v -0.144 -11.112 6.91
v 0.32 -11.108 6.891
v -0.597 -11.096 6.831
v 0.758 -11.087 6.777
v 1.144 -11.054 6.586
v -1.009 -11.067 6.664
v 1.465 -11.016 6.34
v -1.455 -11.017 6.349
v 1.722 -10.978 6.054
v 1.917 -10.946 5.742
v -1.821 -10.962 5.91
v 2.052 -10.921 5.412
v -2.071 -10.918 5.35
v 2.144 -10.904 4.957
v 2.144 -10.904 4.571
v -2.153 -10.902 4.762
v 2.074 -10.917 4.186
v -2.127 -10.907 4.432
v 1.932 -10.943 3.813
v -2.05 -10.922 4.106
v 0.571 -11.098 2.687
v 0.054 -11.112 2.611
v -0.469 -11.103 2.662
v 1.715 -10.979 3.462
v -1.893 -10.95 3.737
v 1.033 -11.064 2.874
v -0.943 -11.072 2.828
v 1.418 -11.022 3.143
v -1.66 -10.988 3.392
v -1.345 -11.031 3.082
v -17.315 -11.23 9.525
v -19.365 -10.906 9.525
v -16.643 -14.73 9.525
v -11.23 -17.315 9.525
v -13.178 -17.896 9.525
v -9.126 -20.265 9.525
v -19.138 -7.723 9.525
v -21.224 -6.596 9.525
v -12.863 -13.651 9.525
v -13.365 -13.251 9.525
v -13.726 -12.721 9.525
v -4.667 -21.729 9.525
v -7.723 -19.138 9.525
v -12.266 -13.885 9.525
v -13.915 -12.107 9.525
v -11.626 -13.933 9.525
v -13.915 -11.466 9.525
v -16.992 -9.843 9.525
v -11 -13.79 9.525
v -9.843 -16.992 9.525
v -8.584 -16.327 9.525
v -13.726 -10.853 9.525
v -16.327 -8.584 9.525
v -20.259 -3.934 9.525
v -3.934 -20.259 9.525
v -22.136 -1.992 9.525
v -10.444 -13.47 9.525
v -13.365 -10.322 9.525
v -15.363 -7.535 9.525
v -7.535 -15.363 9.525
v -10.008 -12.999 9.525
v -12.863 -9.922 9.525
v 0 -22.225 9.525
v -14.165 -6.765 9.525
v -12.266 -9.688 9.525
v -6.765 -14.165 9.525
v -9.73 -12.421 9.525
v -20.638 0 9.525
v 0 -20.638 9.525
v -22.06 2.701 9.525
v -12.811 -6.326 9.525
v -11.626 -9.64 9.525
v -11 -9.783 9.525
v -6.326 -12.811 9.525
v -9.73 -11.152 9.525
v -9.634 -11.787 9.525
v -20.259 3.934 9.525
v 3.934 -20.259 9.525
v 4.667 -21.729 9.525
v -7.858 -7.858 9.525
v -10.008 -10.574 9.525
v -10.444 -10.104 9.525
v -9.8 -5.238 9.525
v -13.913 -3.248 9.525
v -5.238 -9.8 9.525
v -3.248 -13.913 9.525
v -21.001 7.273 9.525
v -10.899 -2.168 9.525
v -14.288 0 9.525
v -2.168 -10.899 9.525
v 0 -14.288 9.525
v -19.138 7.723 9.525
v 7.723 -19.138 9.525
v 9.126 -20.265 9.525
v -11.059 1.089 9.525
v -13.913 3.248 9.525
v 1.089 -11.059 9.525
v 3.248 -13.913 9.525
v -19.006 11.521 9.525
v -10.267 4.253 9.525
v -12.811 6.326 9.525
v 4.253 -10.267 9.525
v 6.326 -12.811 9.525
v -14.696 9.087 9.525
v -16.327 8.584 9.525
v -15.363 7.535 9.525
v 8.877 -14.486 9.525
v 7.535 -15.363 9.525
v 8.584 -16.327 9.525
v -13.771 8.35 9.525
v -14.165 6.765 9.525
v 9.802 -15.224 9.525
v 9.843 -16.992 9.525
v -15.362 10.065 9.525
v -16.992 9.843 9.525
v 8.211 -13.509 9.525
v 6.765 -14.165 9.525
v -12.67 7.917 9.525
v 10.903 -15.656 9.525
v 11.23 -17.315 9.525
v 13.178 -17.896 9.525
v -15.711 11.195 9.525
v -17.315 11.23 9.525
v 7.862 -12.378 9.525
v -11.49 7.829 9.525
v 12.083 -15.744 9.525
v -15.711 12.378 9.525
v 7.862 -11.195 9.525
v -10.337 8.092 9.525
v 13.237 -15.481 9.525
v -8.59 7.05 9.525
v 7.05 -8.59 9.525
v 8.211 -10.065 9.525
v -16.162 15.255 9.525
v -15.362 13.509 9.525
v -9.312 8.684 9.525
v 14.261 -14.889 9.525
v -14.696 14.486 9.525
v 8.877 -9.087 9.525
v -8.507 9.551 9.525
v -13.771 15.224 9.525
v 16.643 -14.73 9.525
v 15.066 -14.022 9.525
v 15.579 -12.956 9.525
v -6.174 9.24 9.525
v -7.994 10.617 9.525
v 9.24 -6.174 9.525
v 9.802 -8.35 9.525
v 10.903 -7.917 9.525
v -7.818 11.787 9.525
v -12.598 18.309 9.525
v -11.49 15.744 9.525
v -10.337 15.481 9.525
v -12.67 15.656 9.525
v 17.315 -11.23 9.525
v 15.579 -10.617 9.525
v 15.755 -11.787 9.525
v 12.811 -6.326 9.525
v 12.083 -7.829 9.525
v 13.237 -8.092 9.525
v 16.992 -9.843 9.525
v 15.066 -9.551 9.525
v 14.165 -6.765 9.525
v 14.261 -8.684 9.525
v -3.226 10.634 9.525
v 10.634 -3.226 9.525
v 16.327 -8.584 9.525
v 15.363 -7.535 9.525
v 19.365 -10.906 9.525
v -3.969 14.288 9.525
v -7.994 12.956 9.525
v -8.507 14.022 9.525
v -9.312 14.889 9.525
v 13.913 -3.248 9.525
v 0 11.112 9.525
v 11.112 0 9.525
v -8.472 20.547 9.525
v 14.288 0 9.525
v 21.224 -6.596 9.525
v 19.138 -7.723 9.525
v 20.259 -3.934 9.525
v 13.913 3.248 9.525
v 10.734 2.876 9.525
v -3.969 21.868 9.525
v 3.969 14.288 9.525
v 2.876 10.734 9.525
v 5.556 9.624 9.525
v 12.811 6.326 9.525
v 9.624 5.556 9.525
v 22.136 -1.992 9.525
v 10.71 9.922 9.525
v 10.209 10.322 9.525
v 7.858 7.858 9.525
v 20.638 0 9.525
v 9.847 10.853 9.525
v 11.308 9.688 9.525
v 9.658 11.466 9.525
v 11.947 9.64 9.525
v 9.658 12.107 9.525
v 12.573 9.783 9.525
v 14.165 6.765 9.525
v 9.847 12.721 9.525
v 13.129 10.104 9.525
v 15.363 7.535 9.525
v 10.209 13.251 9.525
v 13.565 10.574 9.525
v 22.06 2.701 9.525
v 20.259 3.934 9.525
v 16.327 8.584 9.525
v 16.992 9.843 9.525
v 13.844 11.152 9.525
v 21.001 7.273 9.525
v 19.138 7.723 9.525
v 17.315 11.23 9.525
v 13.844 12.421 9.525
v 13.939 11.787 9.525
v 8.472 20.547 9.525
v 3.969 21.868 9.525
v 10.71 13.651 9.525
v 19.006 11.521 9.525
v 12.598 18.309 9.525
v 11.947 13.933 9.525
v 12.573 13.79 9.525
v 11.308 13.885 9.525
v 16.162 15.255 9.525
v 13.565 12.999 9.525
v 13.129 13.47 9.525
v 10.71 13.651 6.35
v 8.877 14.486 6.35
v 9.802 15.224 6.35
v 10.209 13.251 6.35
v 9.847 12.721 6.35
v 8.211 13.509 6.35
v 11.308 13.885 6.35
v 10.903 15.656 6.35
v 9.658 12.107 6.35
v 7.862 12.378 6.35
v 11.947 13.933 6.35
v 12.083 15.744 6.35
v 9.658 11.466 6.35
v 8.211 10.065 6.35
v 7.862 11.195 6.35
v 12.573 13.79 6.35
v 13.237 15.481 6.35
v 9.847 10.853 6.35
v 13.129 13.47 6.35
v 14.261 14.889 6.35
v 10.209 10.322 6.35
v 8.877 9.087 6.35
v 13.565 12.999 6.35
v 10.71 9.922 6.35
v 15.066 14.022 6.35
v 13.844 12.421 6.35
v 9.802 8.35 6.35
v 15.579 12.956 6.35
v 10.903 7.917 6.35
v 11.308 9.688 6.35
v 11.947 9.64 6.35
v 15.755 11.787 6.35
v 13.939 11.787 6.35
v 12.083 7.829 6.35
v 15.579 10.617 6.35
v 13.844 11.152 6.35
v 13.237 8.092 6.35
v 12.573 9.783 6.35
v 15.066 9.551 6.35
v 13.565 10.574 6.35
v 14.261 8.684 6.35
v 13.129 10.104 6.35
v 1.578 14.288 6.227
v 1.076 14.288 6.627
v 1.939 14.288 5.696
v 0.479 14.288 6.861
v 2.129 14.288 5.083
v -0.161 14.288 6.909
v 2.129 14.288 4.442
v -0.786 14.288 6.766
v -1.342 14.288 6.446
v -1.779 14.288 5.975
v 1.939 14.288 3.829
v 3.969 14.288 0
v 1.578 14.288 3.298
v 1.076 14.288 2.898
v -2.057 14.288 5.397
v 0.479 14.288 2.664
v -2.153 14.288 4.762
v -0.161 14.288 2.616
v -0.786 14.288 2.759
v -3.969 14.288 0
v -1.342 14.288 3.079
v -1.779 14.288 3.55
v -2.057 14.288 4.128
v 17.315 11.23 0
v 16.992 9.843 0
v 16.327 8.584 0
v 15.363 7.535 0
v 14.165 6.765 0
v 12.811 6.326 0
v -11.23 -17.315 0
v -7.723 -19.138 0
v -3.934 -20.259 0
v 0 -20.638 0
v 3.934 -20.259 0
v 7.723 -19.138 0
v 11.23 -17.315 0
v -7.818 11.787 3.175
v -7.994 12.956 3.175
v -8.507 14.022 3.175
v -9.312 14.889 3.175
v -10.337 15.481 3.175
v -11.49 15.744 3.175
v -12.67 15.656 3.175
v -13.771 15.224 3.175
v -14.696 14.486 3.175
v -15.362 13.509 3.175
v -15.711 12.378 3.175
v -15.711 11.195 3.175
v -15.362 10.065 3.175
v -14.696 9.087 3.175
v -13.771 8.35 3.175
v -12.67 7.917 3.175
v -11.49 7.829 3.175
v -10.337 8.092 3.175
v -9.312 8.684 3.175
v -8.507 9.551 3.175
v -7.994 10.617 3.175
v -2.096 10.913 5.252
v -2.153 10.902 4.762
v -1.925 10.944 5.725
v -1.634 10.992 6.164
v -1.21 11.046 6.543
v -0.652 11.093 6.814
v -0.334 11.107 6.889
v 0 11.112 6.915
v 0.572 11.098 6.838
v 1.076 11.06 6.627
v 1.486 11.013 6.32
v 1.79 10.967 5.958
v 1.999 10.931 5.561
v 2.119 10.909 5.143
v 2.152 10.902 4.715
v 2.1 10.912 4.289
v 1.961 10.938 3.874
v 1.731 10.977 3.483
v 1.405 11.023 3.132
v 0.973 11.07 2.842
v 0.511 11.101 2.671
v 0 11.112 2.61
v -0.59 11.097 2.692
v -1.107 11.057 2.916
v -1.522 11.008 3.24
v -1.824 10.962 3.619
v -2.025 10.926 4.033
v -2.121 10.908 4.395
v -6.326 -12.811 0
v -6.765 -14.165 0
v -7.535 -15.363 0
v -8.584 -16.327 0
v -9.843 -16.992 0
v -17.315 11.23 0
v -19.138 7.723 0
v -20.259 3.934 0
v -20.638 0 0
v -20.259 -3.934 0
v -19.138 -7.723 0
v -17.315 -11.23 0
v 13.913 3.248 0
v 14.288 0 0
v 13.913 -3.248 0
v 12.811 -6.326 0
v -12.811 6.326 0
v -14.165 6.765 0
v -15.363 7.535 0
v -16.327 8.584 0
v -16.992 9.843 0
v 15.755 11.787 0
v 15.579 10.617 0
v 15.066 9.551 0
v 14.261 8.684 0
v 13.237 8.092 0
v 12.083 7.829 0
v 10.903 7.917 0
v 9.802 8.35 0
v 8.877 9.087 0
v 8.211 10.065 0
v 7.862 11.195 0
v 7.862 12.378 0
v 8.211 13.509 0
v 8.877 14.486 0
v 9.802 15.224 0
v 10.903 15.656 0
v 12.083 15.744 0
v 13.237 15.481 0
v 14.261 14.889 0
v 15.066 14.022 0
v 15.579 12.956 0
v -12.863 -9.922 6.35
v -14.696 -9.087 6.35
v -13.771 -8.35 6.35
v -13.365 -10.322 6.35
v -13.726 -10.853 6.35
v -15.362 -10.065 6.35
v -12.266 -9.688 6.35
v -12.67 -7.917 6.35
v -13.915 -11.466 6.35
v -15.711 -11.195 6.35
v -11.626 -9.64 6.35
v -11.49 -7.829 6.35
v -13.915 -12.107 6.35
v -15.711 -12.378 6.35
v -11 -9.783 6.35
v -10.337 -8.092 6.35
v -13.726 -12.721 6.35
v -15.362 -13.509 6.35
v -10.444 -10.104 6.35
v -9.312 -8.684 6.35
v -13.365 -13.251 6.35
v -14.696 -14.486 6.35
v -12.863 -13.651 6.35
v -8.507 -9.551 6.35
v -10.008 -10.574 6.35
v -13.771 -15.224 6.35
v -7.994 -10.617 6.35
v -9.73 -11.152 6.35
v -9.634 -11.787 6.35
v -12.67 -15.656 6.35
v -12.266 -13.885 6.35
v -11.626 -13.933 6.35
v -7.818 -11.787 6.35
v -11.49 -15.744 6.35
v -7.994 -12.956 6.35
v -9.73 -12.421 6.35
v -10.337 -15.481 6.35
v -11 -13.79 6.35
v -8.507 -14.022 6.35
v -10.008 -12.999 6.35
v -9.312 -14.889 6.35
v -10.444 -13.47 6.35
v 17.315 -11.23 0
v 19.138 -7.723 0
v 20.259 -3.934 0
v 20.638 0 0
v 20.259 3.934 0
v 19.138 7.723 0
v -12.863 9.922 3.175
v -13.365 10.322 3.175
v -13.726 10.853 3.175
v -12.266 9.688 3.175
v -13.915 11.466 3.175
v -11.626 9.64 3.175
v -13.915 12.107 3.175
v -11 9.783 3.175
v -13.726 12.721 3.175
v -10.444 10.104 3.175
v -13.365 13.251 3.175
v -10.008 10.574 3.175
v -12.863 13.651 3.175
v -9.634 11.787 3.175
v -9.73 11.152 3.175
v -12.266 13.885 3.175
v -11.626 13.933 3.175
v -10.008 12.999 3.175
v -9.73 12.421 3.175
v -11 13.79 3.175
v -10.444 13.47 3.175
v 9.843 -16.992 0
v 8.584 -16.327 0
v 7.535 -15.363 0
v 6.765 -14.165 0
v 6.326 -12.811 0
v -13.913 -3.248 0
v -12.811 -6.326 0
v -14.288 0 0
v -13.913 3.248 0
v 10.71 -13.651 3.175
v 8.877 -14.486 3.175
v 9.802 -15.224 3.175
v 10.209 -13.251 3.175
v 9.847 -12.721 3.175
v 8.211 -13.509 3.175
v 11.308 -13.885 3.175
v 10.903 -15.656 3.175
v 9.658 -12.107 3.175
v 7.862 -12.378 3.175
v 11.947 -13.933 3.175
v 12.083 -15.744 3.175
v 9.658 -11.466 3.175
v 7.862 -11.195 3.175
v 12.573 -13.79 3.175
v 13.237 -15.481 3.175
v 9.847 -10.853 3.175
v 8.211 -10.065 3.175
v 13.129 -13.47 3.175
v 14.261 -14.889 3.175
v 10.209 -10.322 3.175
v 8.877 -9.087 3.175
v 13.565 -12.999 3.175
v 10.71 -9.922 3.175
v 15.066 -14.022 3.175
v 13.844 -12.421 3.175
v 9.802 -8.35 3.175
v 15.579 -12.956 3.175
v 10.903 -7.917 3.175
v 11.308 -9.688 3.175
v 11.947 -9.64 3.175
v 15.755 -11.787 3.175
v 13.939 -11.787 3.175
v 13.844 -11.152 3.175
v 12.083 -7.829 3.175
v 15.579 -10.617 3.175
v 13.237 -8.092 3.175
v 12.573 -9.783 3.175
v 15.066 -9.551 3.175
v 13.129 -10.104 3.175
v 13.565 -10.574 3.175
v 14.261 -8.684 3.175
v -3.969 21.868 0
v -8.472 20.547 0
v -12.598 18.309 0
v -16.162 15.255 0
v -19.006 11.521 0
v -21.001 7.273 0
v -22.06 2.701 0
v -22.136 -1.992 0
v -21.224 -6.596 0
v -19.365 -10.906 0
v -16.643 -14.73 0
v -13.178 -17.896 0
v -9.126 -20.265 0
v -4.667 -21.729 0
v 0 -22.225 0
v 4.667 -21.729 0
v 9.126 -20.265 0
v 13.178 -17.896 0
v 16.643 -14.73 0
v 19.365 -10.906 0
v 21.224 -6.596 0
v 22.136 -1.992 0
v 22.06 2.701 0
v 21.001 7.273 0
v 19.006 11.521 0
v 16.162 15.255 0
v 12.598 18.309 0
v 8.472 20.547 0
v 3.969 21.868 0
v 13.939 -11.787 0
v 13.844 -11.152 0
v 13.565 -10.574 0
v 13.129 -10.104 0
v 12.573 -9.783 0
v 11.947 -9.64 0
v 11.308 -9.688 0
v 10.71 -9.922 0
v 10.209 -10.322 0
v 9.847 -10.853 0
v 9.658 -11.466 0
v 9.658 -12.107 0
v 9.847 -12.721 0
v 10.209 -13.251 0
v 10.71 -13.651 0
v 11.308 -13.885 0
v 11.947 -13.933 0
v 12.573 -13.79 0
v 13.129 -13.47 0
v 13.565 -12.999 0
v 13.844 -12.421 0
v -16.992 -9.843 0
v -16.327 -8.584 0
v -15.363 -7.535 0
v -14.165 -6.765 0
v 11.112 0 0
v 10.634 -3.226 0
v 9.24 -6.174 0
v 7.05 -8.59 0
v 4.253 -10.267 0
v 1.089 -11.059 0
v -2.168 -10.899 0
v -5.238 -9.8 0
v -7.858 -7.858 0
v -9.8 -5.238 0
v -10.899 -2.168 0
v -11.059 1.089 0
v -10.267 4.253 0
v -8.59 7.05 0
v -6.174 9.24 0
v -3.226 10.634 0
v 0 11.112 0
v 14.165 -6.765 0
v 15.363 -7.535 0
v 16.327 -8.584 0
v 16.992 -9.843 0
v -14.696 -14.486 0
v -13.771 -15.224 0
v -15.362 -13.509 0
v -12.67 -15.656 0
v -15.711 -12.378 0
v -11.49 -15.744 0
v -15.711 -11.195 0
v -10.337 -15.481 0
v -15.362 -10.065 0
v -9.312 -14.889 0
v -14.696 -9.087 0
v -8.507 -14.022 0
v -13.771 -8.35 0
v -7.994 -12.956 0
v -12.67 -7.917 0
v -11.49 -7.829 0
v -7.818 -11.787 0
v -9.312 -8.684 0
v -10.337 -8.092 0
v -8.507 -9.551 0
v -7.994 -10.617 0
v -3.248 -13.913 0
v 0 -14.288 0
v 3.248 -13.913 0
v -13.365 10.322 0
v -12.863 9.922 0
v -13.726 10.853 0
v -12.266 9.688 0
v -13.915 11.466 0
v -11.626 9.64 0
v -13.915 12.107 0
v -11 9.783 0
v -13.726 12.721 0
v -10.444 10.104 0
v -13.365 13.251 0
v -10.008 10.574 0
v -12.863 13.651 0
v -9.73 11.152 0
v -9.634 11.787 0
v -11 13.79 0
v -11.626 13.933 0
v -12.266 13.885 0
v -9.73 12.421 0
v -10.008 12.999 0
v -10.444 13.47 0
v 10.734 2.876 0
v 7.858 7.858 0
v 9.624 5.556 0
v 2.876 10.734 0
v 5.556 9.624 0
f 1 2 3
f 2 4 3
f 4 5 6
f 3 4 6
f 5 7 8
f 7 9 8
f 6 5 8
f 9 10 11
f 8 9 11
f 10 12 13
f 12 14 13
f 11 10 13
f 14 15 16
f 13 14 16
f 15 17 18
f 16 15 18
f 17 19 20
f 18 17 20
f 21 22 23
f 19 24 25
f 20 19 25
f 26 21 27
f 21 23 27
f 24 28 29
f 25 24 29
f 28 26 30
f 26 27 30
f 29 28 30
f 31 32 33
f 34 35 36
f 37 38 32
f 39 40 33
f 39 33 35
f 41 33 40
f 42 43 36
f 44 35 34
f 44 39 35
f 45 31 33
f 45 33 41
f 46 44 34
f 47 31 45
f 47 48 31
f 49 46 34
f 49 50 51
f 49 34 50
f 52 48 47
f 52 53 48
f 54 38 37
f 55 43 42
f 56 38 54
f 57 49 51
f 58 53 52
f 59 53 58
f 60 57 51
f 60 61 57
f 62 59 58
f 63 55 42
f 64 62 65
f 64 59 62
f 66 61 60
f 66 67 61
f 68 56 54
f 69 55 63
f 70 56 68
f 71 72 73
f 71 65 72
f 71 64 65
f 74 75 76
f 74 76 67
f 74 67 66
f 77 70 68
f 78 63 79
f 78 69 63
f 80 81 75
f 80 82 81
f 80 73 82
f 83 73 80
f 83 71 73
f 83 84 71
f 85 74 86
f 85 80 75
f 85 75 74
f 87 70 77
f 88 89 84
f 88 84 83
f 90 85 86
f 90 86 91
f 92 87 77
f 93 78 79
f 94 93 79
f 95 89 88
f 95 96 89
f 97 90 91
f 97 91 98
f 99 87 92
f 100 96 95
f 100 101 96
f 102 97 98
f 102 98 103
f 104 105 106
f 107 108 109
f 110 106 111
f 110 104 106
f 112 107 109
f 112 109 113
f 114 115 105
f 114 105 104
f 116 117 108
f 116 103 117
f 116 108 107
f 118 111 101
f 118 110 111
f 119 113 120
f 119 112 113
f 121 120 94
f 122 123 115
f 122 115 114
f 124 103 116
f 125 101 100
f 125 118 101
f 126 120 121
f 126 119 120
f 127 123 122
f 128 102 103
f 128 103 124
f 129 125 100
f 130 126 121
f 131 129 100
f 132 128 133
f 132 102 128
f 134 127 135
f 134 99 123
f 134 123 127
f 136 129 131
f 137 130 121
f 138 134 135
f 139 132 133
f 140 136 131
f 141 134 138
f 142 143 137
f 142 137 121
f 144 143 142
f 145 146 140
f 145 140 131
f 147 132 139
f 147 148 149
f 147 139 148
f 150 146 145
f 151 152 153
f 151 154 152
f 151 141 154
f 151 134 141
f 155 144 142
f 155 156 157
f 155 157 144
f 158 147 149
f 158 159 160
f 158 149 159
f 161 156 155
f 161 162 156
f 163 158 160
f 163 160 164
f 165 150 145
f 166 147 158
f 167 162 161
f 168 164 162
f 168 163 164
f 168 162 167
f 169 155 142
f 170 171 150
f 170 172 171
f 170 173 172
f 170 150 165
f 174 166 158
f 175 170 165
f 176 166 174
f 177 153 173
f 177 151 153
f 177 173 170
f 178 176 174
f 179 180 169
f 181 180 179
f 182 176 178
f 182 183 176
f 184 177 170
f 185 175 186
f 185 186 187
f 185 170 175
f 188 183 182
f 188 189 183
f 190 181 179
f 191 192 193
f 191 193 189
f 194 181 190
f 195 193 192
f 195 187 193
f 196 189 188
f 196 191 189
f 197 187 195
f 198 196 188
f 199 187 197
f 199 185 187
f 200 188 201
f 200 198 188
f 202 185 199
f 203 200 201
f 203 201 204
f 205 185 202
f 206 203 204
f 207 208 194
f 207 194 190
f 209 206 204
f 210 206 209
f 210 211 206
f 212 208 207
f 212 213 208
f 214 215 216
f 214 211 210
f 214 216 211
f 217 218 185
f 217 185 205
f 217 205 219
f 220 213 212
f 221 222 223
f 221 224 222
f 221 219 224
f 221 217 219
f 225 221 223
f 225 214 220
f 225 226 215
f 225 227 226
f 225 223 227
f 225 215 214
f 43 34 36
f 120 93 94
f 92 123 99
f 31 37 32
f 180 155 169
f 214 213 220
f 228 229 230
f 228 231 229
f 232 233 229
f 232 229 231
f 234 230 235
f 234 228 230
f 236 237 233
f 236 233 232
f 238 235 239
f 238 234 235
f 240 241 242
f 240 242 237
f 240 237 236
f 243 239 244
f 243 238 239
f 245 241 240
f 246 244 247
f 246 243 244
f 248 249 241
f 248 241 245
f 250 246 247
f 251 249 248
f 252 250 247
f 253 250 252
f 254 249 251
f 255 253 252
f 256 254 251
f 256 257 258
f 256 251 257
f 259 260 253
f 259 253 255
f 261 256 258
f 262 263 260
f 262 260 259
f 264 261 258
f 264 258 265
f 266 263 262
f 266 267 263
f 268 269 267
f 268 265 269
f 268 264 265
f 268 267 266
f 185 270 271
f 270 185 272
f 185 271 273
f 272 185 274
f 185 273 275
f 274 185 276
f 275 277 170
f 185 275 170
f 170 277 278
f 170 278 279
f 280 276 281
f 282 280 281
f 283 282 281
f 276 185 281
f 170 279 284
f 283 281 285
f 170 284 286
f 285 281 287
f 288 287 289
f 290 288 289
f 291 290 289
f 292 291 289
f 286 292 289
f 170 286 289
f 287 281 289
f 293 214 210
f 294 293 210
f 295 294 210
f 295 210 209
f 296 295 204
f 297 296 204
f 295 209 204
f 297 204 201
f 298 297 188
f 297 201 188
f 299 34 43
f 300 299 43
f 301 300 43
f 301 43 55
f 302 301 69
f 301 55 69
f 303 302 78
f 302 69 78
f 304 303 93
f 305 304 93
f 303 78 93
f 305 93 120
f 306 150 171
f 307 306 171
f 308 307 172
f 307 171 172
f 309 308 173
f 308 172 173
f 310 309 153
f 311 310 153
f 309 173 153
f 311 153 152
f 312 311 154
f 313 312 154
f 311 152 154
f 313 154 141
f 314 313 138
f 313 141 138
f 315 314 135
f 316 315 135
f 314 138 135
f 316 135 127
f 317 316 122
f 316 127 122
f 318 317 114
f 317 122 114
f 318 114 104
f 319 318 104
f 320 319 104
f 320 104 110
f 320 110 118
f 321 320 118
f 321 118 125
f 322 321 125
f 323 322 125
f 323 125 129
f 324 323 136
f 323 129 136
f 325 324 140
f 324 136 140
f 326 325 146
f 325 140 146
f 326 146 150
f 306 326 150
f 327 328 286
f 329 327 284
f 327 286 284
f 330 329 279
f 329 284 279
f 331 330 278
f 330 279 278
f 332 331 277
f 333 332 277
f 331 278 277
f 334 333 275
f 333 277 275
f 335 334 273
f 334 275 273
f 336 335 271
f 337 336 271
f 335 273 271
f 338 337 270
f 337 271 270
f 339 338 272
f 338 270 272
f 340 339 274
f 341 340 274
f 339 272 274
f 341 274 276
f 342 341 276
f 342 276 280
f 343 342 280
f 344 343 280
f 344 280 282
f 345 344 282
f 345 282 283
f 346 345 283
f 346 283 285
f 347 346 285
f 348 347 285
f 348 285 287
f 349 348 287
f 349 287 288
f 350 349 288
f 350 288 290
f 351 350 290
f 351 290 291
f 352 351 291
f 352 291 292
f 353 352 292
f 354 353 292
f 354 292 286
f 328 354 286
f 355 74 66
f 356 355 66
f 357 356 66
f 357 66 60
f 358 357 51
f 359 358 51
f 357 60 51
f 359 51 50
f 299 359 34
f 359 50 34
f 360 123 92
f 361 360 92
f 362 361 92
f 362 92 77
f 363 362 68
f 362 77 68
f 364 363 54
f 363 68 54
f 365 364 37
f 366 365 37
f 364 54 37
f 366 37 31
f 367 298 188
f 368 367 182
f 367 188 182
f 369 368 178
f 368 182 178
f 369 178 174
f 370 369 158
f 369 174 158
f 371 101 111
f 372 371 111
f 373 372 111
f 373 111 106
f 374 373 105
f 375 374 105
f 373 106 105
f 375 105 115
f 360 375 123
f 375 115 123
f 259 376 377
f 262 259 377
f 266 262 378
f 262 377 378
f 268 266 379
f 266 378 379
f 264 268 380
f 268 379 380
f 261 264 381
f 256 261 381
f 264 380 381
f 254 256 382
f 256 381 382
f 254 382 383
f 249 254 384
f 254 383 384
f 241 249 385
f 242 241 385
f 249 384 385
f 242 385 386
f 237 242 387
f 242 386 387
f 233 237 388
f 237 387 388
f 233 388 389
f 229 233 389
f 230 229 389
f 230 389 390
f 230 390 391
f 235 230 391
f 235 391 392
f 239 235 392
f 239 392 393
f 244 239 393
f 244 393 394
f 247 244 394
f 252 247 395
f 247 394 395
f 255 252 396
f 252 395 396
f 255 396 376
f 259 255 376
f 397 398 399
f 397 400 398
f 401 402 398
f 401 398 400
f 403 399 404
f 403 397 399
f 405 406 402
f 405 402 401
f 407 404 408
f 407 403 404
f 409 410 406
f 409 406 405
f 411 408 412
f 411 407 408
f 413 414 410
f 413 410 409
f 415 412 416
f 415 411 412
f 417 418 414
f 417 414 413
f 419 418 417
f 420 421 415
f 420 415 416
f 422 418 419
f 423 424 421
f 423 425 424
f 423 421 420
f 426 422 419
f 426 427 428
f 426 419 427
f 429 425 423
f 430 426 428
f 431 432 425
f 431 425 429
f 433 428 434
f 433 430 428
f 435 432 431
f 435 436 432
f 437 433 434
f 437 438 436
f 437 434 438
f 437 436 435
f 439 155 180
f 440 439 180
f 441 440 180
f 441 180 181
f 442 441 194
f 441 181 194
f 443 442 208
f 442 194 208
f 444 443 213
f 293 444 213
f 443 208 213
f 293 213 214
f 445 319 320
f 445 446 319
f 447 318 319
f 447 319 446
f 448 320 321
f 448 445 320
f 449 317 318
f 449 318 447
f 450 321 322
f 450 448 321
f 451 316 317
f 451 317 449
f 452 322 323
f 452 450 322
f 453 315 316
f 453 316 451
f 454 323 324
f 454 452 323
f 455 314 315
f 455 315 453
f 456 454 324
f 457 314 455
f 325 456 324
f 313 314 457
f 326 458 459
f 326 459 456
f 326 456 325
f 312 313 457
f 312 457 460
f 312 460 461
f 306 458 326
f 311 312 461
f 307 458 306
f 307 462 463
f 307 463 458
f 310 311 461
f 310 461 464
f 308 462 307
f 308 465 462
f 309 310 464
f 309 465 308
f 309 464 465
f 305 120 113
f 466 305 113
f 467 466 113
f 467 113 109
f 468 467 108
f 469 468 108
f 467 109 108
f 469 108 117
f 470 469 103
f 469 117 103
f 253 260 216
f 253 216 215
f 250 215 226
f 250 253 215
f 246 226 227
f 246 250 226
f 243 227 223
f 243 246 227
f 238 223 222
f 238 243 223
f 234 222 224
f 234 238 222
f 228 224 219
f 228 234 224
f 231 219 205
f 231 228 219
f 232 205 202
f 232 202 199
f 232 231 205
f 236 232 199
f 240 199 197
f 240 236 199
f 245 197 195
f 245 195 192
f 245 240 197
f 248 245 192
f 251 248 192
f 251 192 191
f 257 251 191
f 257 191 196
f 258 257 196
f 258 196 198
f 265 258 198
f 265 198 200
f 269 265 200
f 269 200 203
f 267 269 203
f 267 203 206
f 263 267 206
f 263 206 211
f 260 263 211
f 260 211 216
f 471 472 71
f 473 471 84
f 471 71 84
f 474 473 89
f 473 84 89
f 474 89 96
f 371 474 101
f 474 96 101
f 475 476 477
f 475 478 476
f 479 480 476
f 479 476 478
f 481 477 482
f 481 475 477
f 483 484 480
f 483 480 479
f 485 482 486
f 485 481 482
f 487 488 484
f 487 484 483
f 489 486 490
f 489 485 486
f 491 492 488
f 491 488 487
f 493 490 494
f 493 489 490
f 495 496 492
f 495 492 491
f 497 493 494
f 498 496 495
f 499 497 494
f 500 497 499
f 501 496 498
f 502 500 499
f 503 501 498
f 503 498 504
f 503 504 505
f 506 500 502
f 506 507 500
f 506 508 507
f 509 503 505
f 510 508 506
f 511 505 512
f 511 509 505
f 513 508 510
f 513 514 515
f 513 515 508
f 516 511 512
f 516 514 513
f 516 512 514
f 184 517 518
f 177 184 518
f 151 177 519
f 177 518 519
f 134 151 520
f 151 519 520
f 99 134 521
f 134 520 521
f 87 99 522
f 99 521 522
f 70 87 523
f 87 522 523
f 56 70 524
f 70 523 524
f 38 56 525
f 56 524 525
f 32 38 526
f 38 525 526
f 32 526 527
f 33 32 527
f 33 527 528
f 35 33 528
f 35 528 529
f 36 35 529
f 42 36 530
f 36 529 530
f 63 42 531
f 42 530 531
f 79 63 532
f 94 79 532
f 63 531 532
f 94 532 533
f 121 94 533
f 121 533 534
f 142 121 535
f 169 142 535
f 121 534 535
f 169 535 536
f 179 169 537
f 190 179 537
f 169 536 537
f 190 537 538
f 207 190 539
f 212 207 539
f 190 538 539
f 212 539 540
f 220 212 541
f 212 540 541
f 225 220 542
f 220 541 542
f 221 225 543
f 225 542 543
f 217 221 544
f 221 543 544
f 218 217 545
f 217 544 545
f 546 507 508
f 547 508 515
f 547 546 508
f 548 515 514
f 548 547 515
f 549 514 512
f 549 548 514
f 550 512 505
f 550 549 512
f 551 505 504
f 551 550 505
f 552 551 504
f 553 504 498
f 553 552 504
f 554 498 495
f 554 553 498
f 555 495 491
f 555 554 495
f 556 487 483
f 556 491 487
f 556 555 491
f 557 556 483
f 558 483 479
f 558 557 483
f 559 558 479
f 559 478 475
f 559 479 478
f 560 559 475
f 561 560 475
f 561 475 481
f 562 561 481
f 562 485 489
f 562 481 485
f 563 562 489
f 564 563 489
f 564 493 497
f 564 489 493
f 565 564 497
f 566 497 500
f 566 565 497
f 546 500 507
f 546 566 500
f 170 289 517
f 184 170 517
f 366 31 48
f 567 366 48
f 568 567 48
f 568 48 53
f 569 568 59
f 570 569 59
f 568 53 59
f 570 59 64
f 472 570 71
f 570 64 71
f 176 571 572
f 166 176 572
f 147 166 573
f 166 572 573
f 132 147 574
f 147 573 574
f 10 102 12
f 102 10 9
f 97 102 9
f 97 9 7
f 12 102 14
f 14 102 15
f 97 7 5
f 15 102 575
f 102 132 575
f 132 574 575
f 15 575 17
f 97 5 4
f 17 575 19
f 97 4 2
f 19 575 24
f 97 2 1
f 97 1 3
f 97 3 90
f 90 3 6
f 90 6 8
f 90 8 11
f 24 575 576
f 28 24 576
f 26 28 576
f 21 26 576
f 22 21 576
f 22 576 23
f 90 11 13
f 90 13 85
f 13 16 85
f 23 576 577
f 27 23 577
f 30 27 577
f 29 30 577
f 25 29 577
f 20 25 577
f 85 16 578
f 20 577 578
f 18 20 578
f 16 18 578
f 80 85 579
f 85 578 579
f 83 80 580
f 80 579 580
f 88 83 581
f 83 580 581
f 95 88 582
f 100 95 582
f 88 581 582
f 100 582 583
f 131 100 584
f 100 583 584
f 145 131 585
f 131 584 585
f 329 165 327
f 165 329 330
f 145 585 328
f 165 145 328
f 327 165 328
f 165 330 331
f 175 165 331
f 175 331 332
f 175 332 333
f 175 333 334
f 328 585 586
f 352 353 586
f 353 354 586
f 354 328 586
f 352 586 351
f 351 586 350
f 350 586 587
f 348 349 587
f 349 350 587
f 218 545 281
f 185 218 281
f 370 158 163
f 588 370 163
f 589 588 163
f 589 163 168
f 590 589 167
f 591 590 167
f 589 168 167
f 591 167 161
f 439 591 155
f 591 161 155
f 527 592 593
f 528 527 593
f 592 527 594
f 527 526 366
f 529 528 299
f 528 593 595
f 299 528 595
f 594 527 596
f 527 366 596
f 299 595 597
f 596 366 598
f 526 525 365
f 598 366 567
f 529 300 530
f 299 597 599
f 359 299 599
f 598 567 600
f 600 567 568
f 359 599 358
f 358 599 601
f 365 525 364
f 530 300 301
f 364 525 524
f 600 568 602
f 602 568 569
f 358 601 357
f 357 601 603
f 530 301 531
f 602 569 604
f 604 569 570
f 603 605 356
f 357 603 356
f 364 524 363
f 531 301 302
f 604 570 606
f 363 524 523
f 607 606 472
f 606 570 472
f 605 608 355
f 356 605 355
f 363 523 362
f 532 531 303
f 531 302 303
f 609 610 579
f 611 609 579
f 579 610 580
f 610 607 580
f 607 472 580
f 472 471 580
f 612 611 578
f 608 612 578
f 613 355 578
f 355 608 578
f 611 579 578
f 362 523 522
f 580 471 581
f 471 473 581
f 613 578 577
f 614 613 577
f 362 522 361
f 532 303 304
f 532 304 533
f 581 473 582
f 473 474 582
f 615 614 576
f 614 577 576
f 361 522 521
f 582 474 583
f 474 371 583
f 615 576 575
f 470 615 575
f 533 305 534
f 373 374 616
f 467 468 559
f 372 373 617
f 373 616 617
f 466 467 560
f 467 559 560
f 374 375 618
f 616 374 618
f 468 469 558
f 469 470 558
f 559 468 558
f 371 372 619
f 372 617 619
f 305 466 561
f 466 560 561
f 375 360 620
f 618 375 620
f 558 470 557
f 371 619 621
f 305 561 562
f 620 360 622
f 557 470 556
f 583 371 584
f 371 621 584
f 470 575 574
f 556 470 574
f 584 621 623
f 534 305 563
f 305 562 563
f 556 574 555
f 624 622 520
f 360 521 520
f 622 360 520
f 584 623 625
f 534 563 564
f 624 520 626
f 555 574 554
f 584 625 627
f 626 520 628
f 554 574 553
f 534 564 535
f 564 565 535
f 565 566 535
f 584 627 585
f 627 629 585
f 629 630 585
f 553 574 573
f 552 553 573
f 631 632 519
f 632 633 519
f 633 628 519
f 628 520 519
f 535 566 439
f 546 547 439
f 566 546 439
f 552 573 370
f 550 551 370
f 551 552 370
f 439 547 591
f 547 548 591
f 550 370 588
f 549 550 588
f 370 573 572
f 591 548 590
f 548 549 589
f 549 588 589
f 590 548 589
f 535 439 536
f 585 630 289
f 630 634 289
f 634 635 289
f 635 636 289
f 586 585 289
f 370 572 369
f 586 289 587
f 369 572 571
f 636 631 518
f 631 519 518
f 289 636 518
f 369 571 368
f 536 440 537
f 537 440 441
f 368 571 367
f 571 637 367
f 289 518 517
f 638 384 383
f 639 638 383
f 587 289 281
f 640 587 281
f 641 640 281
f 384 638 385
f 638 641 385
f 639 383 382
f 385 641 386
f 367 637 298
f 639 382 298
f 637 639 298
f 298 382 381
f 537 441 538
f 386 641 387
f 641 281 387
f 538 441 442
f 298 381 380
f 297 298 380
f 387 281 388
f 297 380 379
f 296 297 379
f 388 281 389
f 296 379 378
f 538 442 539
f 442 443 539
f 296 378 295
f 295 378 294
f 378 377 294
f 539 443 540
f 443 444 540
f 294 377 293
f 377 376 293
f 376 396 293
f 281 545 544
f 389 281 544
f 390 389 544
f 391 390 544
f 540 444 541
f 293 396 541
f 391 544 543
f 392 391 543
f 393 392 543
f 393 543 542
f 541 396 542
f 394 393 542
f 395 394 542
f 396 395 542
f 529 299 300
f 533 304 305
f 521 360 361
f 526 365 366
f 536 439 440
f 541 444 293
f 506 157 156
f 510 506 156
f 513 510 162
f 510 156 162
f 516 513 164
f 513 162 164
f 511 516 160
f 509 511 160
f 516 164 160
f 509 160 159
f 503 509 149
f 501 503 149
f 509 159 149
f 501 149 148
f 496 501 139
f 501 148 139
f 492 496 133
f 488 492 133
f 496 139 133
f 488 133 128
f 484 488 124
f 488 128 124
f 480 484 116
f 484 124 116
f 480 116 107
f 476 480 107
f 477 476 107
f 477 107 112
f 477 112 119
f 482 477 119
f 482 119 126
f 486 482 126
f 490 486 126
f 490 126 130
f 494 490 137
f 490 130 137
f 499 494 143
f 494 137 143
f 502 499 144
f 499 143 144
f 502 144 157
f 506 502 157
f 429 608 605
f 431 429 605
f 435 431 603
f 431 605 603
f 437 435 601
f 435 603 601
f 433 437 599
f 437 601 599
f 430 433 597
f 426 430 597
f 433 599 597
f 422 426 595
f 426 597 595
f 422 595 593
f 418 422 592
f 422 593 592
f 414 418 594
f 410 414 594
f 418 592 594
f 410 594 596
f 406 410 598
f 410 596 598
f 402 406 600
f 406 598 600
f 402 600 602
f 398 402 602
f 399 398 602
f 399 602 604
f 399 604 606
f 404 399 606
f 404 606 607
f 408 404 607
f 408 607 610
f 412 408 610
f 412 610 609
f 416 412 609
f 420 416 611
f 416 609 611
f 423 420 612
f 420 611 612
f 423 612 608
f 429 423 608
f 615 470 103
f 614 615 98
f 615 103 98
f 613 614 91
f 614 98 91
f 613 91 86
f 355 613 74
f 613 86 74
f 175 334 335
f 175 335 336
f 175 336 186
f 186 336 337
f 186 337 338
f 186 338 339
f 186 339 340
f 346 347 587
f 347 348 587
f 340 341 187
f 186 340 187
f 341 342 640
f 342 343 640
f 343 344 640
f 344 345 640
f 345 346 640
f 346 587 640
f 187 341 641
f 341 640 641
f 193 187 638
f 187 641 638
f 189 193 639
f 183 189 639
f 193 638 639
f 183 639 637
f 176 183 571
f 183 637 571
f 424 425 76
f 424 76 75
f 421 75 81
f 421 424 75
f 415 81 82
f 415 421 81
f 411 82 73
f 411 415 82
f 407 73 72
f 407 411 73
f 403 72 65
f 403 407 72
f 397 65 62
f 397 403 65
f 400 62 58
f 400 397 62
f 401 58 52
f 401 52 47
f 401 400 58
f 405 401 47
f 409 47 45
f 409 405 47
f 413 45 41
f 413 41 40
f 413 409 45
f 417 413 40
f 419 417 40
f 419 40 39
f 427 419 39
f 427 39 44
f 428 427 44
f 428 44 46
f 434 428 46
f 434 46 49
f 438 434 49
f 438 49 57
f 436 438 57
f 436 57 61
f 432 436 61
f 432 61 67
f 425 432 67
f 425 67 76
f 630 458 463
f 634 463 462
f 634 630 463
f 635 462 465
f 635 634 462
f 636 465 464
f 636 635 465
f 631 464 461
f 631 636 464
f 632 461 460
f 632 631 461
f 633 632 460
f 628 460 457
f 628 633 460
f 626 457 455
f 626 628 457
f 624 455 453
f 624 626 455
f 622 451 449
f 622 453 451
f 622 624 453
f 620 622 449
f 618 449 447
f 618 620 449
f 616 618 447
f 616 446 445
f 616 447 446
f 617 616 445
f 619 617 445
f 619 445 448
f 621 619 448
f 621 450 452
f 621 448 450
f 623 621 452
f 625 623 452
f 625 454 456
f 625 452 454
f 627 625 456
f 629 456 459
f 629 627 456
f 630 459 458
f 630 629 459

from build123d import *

# Parameters (mm, degrees)
F0_R             = 2.15265
F1_DEPTH         = 9.525
F2_R             = 2.15265
F3_REACH         = 42.6021136501
F6_R             = 3.96875
F7_DEPTH         = 6.35
F8_R             = 3.96875
F9_DEPTH         = 6.35
F11_DEPTH        = 9.525
F11_COPIES_COUNT = 3
F11_COPIES_ANGLE = 180


# Not quite as in the source:
# - a pattern or mirror of a feature is missing from the dataset's text; its kind, count and spacing are read off the source's solid


with BuildPart() as f1:
    # F0 (on Top) → F1 (new body)
    with BuildSketch(Plane.XY):
        with BuildLine():
            Line((3.96875, 14.2875), (0, 14.2875))
            Line((0, 14.2875), (-3.96875, 14.2875))
            Line((-3.96875, 14.2875), (-3.96875, 21.8677764859))
            ThreePointArc((-3.96875, 21.8677764859), (0, -22.225), (3.96875, 21.8677764859))
            Line((3.96875, 21.8677764859), (3.96875, 14.2875))
        make_face()
        with Locations((-11.7865861589, -11.7865861589)):
            Circle(F0_R, mode=Mode.SUBTRACT)
        with Locations((11.7865861589, -11.7865861589)):
            Circle(F0_R, mode=Mode.SUBTRACT)
        with Locations((-11.7865861589, 11.7865861589)):
            Circle(F0_R, mode=Mode.SUBTRACT)
        with BuildLine():
            ThreePointArc((0, 11.1125), (7.8577241059, 7.8577241059), (11.1125, 0))
            ThreePointArc((11.1125, 0), (-7.8577241059, -7.8577241059), (0, 11.1125))
        make_face(mode=Mode.SUBTRACT)
        with Locations((11.7865861589, 11.7865861589)):
            Circle(F0_R, mode=Mode.SUBTRACT)
    extrude(amount=F1_DEPTH)

    f3_end = f1.faces().sort_by_distance((0, -11.1125, 4.7625))[0]
    # F2 (on face) → F3 (cut, up to a face of the model that its end follows)
    with BuildSketch(Plane(origin=(0, 14.2875, 0), x_dir=(-1, 0, 0), z_dir=(0, 1, 0))):
        with Locations((0, 4.7625)):
            Circle(F2_R)
    f3_long = extrude(amount=-F3_REACH, mode=Mode.PRIVATE)
    add(split(f3_long, bisect_by=f3_end, keep=Keep.ALL, mode=Mode.PRIVATE).solids().sort_by_distance((0, 14.2875, 4.7625))[0], mode=Mode.SUBTRACT)

    # F6 (on face) → F7 (cut, through all)
    with BuildSketch(Plane.XY.offset(9.525)):
        with Locations((-11.7865861589, 11.7865861589)):
            Circle(F6_R)
        with Locations((11.7865861589, -11.7865861589)):
            Circle(F6_R)
    extrude(amount=-F7_DEPTH, mode=Mode.SUBTRACT)

    # F8 (on face) → F9 (cut, through all)
    with BuildSketch(Plane(origin=(0, 0, 0), x_dir=(1, 0, 0), z_dir=(0, 0, -1))):
        with Locations((11.7865861589, -11.7865861589)):
            Circle(F8_R)
        with Locations((-11.7865861589, 11.7865861589)):
            Circle(F8_R)
    extrude(amount=-F9_DEPTH, mode=Mode.SUBTRACT)

    # F10 (on face) → F11 (cut, through all)
    with BuildSketch(Plane.XY.offset(9.525)):
        with BuildLine():
            ThreePointArc((-12.8109235396, -6.3255746232), (-14.2875, 0), (-12.8109235396, 6.3255746232))
            ThreePointArc((-12.8109235396, 6.3255746232), (-15.8788163052, 8.0281867), (-17.3148424047, 11.229543123))
            ThreePointArc((-17.3148424047, 11.229543123), (-20.6375, 0), (-17.3148424047, -11.229543123))
            ThreePointArc((-17.3148424047, -11.229543123), (-15.8788163052, -8.0281867), (-12.8109235396, -6.3255746232))
        make_face()
    f11 = extrude(amount=-F11_DEPTH, mode=Mode.SUBTRACT)

    # F11_copies: F11 ×3 about axis
    f11_copies_axis = Axis((0, 0, 0), (0, 0, 1))
    for i in range(1, F11_COPIES_COUNT):
        add(f11.rotate(f11_copies_axis, i * F11_COPIES_ANGLE / (F11_COPIES_COUNT - 1)), mode=Mode.SUBTRACT)


solid = f1.part
